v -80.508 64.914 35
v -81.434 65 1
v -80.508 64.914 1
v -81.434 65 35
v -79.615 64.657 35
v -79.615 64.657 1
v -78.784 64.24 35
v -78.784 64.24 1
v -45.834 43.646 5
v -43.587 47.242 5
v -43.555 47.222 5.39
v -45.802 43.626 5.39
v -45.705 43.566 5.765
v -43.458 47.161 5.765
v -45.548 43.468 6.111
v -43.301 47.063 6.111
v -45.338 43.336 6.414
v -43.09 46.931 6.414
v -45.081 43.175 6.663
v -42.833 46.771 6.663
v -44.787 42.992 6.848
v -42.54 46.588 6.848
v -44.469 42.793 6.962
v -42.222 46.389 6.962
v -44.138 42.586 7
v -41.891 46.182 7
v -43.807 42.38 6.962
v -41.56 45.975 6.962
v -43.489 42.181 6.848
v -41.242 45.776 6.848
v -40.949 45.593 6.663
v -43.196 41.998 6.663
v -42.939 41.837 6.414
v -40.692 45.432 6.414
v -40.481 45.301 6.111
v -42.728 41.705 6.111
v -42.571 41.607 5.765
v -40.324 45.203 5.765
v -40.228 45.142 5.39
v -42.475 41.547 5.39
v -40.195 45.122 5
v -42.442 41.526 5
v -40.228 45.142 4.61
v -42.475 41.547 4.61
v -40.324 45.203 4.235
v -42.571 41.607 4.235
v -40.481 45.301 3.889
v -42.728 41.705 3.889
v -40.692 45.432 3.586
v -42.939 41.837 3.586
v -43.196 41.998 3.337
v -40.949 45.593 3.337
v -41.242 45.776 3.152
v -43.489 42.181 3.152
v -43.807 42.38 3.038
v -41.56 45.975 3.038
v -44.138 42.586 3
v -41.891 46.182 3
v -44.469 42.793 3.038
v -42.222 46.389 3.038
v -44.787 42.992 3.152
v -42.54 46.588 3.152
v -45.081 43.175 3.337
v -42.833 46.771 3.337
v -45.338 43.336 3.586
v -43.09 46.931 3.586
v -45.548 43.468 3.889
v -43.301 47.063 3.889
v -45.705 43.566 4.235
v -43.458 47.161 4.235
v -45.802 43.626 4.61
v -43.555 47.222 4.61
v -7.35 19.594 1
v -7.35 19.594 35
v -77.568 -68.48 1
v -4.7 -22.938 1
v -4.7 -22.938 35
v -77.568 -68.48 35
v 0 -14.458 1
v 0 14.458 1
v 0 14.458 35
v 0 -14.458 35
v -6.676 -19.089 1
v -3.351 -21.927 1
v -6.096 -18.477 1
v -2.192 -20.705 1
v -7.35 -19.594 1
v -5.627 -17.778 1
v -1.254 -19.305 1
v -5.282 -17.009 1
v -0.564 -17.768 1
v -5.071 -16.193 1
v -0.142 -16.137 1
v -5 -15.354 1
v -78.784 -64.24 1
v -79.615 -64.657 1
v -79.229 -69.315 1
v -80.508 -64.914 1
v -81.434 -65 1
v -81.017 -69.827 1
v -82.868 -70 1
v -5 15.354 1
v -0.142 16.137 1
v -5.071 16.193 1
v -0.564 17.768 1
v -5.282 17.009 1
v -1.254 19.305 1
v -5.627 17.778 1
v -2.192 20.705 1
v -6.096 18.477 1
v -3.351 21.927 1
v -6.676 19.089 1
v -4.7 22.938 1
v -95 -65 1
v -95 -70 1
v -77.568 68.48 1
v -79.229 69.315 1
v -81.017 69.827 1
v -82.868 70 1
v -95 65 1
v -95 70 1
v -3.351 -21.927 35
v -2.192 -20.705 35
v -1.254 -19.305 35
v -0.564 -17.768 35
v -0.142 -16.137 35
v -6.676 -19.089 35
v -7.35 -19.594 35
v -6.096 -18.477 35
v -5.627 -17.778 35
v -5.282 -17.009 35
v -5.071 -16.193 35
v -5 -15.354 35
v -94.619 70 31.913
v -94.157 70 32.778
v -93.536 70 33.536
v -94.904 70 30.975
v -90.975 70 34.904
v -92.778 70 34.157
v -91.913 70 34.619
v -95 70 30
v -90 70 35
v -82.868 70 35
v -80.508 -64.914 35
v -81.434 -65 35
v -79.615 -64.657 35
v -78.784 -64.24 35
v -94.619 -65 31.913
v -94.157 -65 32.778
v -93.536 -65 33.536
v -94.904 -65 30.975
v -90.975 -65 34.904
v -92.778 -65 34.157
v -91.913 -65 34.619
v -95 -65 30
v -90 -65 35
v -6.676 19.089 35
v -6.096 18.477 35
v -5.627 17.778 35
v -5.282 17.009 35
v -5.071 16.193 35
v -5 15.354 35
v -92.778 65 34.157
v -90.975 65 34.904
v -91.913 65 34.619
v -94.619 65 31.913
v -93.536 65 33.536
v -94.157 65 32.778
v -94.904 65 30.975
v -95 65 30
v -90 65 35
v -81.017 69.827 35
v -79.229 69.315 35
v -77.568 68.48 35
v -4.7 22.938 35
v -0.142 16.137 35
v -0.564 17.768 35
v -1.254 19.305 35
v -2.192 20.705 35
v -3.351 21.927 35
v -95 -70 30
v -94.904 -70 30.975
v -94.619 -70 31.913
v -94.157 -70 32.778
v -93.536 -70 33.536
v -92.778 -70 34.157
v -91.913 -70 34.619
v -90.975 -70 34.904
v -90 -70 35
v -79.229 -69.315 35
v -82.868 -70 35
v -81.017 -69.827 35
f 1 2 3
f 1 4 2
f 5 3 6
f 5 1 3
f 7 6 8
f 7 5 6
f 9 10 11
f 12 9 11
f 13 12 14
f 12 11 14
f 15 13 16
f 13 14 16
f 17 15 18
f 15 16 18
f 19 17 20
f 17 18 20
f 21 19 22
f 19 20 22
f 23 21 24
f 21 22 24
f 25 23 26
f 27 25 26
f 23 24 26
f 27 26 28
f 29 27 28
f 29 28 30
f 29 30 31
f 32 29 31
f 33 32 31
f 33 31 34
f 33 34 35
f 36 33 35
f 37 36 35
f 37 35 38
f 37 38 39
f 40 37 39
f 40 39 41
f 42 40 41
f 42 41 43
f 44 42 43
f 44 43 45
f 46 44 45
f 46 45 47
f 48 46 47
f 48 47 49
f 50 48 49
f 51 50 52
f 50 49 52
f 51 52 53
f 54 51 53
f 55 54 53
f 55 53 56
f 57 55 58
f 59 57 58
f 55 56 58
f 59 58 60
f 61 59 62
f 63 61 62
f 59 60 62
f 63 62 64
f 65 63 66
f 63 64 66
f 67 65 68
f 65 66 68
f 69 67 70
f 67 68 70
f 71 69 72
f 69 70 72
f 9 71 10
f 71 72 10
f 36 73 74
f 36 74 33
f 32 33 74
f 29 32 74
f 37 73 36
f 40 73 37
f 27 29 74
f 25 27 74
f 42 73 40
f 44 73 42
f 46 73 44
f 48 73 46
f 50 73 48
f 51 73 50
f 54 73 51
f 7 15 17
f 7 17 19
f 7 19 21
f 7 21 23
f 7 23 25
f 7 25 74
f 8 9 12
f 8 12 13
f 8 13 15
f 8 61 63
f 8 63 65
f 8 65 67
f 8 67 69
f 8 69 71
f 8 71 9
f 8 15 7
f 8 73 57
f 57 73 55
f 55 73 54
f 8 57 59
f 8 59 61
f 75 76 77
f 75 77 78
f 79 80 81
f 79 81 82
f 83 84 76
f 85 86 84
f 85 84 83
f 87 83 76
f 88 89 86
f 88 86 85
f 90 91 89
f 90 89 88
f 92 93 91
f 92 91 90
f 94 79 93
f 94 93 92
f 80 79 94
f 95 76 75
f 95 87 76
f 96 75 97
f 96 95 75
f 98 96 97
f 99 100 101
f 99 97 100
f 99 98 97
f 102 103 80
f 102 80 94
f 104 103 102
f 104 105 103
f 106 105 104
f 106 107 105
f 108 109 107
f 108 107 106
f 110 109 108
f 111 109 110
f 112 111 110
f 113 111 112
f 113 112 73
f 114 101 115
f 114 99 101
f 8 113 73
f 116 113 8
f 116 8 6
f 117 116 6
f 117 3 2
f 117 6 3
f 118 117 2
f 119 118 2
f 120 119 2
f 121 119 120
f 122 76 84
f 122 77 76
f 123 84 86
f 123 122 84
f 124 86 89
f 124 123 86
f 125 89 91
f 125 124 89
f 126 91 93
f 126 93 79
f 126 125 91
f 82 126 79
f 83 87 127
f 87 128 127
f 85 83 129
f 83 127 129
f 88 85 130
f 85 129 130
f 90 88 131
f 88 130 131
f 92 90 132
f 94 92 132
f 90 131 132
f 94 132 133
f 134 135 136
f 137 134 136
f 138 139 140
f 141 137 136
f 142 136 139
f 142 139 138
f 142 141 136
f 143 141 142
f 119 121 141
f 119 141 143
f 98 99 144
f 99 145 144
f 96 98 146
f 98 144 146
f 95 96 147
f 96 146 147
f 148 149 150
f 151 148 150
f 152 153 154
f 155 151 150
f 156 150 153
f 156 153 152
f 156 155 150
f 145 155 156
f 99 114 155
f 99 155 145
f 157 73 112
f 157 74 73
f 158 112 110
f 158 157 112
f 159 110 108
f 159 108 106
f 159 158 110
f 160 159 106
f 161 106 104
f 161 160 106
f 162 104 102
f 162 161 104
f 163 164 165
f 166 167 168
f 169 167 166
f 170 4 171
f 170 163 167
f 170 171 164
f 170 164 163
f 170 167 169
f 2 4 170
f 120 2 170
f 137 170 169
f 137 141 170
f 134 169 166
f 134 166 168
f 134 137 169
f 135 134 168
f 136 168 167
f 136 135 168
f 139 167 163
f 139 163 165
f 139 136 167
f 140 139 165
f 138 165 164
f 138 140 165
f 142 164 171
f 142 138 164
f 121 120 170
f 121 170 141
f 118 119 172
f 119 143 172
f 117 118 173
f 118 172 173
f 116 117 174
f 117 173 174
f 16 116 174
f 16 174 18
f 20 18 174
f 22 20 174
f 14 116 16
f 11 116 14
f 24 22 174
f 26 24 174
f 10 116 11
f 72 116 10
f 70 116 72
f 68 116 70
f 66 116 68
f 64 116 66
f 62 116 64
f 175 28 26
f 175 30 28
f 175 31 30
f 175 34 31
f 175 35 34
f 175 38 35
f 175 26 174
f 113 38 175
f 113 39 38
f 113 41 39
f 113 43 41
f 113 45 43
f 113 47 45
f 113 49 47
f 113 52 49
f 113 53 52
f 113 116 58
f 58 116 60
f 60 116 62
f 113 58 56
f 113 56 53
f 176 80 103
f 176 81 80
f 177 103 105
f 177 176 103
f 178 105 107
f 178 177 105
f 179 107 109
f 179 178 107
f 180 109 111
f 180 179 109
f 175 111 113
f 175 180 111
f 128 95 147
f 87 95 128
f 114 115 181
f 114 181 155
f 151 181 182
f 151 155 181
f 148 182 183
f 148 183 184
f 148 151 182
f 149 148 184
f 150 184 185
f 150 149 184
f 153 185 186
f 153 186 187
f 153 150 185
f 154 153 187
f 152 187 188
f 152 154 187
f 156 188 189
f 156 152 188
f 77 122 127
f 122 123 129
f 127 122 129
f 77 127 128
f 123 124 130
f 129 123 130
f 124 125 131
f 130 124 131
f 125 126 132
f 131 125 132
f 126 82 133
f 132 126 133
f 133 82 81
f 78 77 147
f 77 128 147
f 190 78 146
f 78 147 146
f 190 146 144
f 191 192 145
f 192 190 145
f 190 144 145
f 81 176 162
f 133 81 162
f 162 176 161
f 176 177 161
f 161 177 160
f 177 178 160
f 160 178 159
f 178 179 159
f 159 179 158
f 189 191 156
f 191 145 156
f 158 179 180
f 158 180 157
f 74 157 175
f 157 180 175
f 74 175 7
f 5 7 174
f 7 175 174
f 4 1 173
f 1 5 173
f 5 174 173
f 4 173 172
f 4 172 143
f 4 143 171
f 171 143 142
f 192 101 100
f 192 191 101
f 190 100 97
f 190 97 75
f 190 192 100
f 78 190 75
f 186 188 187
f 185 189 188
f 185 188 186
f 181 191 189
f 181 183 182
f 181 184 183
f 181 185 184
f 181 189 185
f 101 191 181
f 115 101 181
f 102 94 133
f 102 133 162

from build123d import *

# Parameters (mm, degrees)
PAD003_DEPTH    = 34
FILLET001_R     = 5
FILLET002_R     = 10
FILLET003_R     = 5
SKETCH013_R     = 2
POCKET005_DEPTH = 5


with BuildPart() as part:
    # Sketch009 (on XY_Plane001 of Origin002) → Pad003 (new body)
    with BuildSketch(Plane.XY.offset(1)):
        Polygon((0, 20), (0, -20), (-80, -70), (-95, -70), (-95, -65), (-80, -65), (-5, -18.125), (-5, 18.125), (-80, 65), (-95, 65), (-95, 70), (-80, 70), align=None)
    extrude(amount=PAD003_DEPTH)

    # Fillet001
    fillet001_edges = [part.edges().sort_by_distance(p)[0] for p in [
        (-95, -67.5, 35),
        (-95, 67.5, 35),
    ]]
    fillet(fillet001_edges, radius=FILLET001_R)

    # Fillet002
    fillet002_edges = [part.edges().sort_by_distance(p)[0] for p in [
        (-80, -70, 18),
        (0, -20, 18),
        (0, 20, 18),
        (-80, 70, 18),
    ]]
    fillet(fillet002_edges, radius=FILLET002_R)

    # Fillet003
    fillet003_edges = [part.edges().sort_by_distance(p)[0] for p in [
        (-80, -65, 18),
        (-5, -18.125, 18),
        (-80, 65, 18),
        (-5, 18.125, 18),
    ]]
    fillet(fillet003_edges, radius=FILLET003_R)

    # Sketch013 (on Face10 of Fillet003) → Pocket005 (cut)
    with BuildSketch(Plane(origin=(8.9887640449, 14.3820224719, 0), x_dir=(-0.847998304, 0.52999894, 0), z_dir=(0.52999894, 0.847998304, 0))):
        with Locations((60, 5)):
            Circle(SKETCH013_R)
    extrude(amount=-POCKET005_DEPTH, mode=Mode.SUBTRACT)


solid = part.part
